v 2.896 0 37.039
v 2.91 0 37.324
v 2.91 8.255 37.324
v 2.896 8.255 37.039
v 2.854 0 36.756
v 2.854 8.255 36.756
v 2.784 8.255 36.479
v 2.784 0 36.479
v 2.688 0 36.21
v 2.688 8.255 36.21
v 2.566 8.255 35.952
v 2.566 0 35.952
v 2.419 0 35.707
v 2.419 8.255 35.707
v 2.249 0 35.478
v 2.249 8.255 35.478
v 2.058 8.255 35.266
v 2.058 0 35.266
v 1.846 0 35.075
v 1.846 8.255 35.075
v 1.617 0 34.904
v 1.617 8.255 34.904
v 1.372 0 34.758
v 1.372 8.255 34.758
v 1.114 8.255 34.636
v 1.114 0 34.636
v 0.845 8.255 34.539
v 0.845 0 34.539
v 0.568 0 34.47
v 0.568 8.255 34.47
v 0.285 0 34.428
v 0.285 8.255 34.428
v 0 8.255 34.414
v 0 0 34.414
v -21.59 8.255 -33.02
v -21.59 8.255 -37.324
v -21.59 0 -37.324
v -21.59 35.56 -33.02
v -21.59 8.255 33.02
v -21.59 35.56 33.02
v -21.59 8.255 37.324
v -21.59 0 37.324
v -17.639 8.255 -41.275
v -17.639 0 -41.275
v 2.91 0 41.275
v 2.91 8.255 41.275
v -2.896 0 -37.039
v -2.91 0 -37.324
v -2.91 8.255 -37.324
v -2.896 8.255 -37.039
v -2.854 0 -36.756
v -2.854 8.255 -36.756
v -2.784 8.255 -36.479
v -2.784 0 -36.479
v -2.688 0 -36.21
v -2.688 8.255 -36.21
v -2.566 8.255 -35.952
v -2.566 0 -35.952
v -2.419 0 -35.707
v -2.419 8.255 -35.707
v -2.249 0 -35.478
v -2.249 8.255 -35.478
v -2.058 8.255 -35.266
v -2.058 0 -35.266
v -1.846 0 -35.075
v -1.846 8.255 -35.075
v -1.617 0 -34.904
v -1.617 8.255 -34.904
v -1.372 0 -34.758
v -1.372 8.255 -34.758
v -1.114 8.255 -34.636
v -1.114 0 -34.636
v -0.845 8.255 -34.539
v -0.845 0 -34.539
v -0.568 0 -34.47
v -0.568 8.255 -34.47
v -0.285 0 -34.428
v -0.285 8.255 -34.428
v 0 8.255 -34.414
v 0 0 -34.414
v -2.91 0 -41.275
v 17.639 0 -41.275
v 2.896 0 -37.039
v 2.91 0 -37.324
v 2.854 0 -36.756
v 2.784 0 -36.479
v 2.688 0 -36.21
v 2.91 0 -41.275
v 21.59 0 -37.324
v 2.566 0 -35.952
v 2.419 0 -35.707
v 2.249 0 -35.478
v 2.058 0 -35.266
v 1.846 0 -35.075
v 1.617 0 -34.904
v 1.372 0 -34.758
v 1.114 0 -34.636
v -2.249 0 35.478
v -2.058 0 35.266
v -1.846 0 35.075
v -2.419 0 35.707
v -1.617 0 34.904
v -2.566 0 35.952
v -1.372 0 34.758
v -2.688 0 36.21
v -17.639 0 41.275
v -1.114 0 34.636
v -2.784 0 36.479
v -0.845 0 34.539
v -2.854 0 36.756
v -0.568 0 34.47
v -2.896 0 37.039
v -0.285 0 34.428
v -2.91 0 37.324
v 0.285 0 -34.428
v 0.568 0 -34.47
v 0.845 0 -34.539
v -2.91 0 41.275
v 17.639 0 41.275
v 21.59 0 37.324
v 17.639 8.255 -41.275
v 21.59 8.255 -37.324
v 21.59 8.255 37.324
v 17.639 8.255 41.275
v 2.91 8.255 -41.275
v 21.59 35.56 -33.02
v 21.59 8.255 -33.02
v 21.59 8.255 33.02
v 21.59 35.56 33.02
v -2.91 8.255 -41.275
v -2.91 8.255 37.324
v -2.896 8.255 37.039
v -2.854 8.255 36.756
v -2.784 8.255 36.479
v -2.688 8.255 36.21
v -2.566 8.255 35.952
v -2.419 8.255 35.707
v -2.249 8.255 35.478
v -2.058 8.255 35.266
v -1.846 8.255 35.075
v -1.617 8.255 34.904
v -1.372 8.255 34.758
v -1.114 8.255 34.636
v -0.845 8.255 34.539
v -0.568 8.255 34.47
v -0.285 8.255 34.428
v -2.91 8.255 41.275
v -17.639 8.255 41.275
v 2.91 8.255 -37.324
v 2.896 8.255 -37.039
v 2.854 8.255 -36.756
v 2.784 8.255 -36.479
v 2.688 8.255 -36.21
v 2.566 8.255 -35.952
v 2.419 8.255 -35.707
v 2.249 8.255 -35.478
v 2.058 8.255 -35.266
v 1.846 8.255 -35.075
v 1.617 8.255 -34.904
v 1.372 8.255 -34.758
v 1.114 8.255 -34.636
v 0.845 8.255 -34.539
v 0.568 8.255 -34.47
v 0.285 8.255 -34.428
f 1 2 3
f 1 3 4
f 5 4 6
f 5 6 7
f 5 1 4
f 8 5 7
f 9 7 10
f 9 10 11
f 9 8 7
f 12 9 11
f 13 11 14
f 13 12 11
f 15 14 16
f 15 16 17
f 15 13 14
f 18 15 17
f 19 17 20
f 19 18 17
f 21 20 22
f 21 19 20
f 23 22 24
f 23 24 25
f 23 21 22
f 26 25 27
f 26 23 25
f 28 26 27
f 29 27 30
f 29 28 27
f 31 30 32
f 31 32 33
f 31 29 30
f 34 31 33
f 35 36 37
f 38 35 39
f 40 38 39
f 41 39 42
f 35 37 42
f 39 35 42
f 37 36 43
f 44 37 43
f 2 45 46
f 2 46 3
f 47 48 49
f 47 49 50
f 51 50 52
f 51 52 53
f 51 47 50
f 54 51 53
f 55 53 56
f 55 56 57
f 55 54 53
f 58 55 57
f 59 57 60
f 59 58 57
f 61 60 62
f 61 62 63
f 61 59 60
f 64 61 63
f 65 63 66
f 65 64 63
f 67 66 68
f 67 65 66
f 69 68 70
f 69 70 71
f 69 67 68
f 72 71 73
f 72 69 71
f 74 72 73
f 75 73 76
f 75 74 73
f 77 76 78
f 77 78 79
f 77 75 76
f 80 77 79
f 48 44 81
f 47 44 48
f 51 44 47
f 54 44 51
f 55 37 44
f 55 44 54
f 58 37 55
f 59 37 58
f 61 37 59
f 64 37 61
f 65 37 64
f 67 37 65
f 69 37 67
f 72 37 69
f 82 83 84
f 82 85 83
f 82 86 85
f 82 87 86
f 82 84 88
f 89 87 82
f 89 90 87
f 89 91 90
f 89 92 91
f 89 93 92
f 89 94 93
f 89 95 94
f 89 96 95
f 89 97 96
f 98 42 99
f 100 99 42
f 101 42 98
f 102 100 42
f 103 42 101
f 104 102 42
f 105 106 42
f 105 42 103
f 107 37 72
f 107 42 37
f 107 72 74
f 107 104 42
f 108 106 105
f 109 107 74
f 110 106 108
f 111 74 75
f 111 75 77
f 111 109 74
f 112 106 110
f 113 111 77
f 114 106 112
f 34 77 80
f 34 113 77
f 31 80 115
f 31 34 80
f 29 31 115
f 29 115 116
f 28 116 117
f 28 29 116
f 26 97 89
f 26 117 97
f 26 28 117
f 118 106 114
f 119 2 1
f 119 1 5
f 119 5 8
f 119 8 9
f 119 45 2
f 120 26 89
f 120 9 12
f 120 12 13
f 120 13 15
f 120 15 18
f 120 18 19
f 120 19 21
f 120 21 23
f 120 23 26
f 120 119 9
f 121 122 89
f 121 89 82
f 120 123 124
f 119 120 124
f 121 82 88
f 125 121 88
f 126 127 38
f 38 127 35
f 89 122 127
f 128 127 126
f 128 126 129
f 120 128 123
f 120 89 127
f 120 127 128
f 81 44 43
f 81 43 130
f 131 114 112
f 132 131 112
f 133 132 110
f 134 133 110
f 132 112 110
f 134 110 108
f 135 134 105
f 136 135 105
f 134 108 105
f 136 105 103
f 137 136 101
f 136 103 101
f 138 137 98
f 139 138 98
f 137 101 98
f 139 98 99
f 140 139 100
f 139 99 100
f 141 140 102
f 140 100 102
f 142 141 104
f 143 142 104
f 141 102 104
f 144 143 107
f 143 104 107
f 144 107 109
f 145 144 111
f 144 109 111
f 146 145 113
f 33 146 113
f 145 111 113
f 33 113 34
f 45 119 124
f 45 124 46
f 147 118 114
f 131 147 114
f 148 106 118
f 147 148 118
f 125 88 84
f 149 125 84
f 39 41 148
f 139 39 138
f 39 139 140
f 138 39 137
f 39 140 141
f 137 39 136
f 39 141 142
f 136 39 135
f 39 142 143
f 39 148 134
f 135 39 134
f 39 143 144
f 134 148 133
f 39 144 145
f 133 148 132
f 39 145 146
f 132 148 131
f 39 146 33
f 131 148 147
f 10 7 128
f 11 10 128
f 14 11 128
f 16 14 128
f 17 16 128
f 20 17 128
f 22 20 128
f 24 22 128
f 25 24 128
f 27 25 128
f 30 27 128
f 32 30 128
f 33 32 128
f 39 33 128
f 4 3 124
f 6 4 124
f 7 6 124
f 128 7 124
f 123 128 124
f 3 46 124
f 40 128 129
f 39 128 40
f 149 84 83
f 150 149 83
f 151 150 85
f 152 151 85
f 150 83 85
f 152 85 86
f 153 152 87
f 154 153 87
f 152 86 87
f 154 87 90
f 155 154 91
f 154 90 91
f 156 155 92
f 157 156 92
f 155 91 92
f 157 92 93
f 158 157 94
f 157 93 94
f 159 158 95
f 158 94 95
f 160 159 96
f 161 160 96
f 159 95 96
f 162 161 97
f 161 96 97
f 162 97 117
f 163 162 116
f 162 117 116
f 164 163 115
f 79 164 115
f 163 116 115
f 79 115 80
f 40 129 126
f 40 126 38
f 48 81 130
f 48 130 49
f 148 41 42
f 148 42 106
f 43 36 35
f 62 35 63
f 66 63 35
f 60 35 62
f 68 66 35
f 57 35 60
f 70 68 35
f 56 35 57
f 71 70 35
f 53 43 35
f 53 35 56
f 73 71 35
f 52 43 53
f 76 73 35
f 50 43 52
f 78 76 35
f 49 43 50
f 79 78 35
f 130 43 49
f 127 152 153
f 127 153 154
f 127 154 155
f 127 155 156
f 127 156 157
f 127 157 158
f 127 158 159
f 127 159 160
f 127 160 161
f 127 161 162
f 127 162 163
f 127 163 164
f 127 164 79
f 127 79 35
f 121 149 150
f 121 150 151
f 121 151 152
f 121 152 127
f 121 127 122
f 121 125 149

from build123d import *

# Parameters (mm, degrees)
SKETCH1_W           = 21.59
SKETCH1_H           = 33.02
BOSS_EXTRUDE1_DEPTH = 35.56
BOSS_EXTRUDE2_DEPTH = 8.255


with BuildPart() as part:
    # Sketch1 → Boss-Extrude1 (new body)
    with BuildSketch(Plane(origin=(0, 0, 0), x_dir=(1, 0, 0), z_dir=(0, 1, 0))):
        with Locations((-10.795, 16.51)):
            Rectangle(SKETCH1_W, SKETCH1_H)
    extrude(amount=BOSS_EXTRUDE1_DEPTH)

    # Sketch1<3> → Boss-Extrude2 (add)
    with BuildSketch(Plane(origin=(0, 0, 0), x_dir=(1, 0, 0), z_dir=(0, 1, 0))):
        with BuildLine():
            Line((-21.59, 33.02), (0, 33.02))
            Line((0, 33.02), (0, 34.414061598))
            ThreePointArc((0, 34.414061598), (-2.057519513, 35.266314085), (-2.909772, 37.323833597))
            Line((-2.909772, 37.323833597), (-2.909772, 41.275))
            Line((-2.909772, 41.275), (-17.638833597, 41.275))
            Line((-17.638833597, 41.275), (-21.59, 37.323833597))
            Line((-21.59, 37.323833597), (-21.59, 33.02))
        make_face()
    extrude(amount=BOSS_EXTRUDE2_DEPTH)

    # Mirror1: part across plane


with BuildPart() as part_1:
    add(part.part)
    add(part.part.mirror(Plane(origin=(0, 35.56, 0), x_dir=(1, 0, 0), z_dir=(0, 0, 1))))

    # Mirror2: part across plane


with BuildPart() as part_2:
    add(part_1.part)
    add(part_1.part.mirror(Plane(origin=(0, 35.56, 0), x_dir=(0, 0, 1), z_dir=(-1, 0, 0))))


solid = part_2.part
